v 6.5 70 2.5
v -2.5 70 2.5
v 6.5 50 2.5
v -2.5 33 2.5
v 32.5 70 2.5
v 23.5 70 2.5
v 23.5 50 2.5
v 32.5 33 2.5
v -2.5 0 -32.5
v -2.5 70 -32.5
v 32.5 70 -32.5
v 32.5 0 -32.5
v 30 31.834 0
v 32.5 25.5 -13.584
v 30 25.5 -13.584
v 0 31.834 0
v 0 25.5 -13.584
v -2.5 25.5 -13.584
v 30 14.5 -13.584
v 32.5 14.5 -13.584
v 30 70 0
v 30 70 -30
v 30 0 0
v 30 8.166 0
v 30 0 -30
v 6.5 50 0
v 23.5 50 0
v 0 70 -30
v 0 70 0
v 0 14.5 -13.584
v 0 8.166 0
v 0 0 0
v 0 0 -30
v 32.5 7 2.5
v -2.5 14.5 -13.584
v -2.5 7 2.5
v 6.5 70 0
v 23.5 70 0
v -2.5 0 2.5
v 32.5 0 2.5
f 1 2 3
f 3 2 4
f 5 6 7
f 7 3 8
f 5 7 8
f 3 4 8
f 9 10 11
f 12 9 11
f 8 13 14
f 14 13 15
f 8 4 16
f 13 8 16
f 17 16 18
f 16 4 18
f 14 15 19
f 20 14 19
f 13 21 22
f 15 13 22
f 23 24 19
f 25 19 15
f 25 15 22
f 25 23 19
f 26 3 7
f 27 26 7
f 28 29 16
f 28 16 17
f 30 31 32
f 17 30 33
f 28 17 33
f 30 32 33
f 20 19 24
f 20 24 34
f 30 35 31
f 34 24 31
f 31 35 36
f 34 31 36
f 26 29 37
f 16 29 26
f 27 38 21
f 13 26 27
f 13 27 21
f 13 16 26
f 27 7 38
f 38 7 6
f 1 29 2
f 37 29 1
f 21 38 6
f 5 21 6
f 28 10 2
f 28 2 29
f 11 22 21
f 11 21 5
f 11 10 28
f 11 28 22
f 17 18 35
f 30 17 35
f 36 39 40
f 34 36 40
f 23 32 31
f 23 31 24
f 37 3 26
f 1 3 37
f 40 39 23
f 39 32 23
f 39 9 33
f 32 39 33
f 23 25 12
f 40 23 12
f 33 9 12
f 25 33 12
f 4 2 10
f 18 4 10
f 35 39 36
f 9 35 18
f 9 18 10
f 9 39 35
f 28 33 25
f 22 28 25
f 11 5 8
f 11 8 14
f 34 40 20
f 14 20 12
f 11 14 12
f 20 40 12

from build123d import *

# Parameters (mm, degrees)
SKETCH1_W           = 35
SKETCH1_H           = 35
SKETCH1_W_2         = 30
SKETCH1_H_2         = 30
BOSS_EXTRUDE1_DEPTH = 70
SKETCH2_W           = 17
SKETCH2_H           = 20
CUT_EXTRUDE1_DEPTH  = 2.5
CUT_EXTRUDE2_DEPTH  = 36


with BuildPart() as part:
    # Sketch1 → Boss-Extrude1 (new body)
    with BuildSketch(Plane(origin=(0, 0, 0), x_dir=(1, 0, 0), z_dir=(0, 1, 0))):
        with Locations((15, 15)):
            Rectangle(SKETCH1_W, SKETCH1_H)
        with Locations((15, 15)):
            Rectangle(SKETCH1_W_2, SKETCH1_H_2, mode=Mode.SUBTRACT)
    extrude(amount=BOSS_EXTRUDE1_DEPTH)

    # Sketch2 → Cut-Extrude1 (cut)
    with BuildSketch(Plane.XY.offset(2.5)):
        with Locations((15, 60)):
            Rectangle(SKETCH2_W, SKETCH2_H)
    extrude(amount=-CUT_EXTRUDE1_DEPTH, mode=Mode.SUBTRACT)

    # Sketch3 → Cut-Extrude2 (cut, through all)
    with BuildSketch(Plane.ZY.offset(2.5)):
        Polygon((2.5, 33), (-13.583801904, 25.5), (-13.583801904, 14.5), (2.5, 7), align=None)
    extrude(amount=-CUT_EXTRUDE2_DEPTH, mode=Mode.SUBTRACT)


solid = part.part
